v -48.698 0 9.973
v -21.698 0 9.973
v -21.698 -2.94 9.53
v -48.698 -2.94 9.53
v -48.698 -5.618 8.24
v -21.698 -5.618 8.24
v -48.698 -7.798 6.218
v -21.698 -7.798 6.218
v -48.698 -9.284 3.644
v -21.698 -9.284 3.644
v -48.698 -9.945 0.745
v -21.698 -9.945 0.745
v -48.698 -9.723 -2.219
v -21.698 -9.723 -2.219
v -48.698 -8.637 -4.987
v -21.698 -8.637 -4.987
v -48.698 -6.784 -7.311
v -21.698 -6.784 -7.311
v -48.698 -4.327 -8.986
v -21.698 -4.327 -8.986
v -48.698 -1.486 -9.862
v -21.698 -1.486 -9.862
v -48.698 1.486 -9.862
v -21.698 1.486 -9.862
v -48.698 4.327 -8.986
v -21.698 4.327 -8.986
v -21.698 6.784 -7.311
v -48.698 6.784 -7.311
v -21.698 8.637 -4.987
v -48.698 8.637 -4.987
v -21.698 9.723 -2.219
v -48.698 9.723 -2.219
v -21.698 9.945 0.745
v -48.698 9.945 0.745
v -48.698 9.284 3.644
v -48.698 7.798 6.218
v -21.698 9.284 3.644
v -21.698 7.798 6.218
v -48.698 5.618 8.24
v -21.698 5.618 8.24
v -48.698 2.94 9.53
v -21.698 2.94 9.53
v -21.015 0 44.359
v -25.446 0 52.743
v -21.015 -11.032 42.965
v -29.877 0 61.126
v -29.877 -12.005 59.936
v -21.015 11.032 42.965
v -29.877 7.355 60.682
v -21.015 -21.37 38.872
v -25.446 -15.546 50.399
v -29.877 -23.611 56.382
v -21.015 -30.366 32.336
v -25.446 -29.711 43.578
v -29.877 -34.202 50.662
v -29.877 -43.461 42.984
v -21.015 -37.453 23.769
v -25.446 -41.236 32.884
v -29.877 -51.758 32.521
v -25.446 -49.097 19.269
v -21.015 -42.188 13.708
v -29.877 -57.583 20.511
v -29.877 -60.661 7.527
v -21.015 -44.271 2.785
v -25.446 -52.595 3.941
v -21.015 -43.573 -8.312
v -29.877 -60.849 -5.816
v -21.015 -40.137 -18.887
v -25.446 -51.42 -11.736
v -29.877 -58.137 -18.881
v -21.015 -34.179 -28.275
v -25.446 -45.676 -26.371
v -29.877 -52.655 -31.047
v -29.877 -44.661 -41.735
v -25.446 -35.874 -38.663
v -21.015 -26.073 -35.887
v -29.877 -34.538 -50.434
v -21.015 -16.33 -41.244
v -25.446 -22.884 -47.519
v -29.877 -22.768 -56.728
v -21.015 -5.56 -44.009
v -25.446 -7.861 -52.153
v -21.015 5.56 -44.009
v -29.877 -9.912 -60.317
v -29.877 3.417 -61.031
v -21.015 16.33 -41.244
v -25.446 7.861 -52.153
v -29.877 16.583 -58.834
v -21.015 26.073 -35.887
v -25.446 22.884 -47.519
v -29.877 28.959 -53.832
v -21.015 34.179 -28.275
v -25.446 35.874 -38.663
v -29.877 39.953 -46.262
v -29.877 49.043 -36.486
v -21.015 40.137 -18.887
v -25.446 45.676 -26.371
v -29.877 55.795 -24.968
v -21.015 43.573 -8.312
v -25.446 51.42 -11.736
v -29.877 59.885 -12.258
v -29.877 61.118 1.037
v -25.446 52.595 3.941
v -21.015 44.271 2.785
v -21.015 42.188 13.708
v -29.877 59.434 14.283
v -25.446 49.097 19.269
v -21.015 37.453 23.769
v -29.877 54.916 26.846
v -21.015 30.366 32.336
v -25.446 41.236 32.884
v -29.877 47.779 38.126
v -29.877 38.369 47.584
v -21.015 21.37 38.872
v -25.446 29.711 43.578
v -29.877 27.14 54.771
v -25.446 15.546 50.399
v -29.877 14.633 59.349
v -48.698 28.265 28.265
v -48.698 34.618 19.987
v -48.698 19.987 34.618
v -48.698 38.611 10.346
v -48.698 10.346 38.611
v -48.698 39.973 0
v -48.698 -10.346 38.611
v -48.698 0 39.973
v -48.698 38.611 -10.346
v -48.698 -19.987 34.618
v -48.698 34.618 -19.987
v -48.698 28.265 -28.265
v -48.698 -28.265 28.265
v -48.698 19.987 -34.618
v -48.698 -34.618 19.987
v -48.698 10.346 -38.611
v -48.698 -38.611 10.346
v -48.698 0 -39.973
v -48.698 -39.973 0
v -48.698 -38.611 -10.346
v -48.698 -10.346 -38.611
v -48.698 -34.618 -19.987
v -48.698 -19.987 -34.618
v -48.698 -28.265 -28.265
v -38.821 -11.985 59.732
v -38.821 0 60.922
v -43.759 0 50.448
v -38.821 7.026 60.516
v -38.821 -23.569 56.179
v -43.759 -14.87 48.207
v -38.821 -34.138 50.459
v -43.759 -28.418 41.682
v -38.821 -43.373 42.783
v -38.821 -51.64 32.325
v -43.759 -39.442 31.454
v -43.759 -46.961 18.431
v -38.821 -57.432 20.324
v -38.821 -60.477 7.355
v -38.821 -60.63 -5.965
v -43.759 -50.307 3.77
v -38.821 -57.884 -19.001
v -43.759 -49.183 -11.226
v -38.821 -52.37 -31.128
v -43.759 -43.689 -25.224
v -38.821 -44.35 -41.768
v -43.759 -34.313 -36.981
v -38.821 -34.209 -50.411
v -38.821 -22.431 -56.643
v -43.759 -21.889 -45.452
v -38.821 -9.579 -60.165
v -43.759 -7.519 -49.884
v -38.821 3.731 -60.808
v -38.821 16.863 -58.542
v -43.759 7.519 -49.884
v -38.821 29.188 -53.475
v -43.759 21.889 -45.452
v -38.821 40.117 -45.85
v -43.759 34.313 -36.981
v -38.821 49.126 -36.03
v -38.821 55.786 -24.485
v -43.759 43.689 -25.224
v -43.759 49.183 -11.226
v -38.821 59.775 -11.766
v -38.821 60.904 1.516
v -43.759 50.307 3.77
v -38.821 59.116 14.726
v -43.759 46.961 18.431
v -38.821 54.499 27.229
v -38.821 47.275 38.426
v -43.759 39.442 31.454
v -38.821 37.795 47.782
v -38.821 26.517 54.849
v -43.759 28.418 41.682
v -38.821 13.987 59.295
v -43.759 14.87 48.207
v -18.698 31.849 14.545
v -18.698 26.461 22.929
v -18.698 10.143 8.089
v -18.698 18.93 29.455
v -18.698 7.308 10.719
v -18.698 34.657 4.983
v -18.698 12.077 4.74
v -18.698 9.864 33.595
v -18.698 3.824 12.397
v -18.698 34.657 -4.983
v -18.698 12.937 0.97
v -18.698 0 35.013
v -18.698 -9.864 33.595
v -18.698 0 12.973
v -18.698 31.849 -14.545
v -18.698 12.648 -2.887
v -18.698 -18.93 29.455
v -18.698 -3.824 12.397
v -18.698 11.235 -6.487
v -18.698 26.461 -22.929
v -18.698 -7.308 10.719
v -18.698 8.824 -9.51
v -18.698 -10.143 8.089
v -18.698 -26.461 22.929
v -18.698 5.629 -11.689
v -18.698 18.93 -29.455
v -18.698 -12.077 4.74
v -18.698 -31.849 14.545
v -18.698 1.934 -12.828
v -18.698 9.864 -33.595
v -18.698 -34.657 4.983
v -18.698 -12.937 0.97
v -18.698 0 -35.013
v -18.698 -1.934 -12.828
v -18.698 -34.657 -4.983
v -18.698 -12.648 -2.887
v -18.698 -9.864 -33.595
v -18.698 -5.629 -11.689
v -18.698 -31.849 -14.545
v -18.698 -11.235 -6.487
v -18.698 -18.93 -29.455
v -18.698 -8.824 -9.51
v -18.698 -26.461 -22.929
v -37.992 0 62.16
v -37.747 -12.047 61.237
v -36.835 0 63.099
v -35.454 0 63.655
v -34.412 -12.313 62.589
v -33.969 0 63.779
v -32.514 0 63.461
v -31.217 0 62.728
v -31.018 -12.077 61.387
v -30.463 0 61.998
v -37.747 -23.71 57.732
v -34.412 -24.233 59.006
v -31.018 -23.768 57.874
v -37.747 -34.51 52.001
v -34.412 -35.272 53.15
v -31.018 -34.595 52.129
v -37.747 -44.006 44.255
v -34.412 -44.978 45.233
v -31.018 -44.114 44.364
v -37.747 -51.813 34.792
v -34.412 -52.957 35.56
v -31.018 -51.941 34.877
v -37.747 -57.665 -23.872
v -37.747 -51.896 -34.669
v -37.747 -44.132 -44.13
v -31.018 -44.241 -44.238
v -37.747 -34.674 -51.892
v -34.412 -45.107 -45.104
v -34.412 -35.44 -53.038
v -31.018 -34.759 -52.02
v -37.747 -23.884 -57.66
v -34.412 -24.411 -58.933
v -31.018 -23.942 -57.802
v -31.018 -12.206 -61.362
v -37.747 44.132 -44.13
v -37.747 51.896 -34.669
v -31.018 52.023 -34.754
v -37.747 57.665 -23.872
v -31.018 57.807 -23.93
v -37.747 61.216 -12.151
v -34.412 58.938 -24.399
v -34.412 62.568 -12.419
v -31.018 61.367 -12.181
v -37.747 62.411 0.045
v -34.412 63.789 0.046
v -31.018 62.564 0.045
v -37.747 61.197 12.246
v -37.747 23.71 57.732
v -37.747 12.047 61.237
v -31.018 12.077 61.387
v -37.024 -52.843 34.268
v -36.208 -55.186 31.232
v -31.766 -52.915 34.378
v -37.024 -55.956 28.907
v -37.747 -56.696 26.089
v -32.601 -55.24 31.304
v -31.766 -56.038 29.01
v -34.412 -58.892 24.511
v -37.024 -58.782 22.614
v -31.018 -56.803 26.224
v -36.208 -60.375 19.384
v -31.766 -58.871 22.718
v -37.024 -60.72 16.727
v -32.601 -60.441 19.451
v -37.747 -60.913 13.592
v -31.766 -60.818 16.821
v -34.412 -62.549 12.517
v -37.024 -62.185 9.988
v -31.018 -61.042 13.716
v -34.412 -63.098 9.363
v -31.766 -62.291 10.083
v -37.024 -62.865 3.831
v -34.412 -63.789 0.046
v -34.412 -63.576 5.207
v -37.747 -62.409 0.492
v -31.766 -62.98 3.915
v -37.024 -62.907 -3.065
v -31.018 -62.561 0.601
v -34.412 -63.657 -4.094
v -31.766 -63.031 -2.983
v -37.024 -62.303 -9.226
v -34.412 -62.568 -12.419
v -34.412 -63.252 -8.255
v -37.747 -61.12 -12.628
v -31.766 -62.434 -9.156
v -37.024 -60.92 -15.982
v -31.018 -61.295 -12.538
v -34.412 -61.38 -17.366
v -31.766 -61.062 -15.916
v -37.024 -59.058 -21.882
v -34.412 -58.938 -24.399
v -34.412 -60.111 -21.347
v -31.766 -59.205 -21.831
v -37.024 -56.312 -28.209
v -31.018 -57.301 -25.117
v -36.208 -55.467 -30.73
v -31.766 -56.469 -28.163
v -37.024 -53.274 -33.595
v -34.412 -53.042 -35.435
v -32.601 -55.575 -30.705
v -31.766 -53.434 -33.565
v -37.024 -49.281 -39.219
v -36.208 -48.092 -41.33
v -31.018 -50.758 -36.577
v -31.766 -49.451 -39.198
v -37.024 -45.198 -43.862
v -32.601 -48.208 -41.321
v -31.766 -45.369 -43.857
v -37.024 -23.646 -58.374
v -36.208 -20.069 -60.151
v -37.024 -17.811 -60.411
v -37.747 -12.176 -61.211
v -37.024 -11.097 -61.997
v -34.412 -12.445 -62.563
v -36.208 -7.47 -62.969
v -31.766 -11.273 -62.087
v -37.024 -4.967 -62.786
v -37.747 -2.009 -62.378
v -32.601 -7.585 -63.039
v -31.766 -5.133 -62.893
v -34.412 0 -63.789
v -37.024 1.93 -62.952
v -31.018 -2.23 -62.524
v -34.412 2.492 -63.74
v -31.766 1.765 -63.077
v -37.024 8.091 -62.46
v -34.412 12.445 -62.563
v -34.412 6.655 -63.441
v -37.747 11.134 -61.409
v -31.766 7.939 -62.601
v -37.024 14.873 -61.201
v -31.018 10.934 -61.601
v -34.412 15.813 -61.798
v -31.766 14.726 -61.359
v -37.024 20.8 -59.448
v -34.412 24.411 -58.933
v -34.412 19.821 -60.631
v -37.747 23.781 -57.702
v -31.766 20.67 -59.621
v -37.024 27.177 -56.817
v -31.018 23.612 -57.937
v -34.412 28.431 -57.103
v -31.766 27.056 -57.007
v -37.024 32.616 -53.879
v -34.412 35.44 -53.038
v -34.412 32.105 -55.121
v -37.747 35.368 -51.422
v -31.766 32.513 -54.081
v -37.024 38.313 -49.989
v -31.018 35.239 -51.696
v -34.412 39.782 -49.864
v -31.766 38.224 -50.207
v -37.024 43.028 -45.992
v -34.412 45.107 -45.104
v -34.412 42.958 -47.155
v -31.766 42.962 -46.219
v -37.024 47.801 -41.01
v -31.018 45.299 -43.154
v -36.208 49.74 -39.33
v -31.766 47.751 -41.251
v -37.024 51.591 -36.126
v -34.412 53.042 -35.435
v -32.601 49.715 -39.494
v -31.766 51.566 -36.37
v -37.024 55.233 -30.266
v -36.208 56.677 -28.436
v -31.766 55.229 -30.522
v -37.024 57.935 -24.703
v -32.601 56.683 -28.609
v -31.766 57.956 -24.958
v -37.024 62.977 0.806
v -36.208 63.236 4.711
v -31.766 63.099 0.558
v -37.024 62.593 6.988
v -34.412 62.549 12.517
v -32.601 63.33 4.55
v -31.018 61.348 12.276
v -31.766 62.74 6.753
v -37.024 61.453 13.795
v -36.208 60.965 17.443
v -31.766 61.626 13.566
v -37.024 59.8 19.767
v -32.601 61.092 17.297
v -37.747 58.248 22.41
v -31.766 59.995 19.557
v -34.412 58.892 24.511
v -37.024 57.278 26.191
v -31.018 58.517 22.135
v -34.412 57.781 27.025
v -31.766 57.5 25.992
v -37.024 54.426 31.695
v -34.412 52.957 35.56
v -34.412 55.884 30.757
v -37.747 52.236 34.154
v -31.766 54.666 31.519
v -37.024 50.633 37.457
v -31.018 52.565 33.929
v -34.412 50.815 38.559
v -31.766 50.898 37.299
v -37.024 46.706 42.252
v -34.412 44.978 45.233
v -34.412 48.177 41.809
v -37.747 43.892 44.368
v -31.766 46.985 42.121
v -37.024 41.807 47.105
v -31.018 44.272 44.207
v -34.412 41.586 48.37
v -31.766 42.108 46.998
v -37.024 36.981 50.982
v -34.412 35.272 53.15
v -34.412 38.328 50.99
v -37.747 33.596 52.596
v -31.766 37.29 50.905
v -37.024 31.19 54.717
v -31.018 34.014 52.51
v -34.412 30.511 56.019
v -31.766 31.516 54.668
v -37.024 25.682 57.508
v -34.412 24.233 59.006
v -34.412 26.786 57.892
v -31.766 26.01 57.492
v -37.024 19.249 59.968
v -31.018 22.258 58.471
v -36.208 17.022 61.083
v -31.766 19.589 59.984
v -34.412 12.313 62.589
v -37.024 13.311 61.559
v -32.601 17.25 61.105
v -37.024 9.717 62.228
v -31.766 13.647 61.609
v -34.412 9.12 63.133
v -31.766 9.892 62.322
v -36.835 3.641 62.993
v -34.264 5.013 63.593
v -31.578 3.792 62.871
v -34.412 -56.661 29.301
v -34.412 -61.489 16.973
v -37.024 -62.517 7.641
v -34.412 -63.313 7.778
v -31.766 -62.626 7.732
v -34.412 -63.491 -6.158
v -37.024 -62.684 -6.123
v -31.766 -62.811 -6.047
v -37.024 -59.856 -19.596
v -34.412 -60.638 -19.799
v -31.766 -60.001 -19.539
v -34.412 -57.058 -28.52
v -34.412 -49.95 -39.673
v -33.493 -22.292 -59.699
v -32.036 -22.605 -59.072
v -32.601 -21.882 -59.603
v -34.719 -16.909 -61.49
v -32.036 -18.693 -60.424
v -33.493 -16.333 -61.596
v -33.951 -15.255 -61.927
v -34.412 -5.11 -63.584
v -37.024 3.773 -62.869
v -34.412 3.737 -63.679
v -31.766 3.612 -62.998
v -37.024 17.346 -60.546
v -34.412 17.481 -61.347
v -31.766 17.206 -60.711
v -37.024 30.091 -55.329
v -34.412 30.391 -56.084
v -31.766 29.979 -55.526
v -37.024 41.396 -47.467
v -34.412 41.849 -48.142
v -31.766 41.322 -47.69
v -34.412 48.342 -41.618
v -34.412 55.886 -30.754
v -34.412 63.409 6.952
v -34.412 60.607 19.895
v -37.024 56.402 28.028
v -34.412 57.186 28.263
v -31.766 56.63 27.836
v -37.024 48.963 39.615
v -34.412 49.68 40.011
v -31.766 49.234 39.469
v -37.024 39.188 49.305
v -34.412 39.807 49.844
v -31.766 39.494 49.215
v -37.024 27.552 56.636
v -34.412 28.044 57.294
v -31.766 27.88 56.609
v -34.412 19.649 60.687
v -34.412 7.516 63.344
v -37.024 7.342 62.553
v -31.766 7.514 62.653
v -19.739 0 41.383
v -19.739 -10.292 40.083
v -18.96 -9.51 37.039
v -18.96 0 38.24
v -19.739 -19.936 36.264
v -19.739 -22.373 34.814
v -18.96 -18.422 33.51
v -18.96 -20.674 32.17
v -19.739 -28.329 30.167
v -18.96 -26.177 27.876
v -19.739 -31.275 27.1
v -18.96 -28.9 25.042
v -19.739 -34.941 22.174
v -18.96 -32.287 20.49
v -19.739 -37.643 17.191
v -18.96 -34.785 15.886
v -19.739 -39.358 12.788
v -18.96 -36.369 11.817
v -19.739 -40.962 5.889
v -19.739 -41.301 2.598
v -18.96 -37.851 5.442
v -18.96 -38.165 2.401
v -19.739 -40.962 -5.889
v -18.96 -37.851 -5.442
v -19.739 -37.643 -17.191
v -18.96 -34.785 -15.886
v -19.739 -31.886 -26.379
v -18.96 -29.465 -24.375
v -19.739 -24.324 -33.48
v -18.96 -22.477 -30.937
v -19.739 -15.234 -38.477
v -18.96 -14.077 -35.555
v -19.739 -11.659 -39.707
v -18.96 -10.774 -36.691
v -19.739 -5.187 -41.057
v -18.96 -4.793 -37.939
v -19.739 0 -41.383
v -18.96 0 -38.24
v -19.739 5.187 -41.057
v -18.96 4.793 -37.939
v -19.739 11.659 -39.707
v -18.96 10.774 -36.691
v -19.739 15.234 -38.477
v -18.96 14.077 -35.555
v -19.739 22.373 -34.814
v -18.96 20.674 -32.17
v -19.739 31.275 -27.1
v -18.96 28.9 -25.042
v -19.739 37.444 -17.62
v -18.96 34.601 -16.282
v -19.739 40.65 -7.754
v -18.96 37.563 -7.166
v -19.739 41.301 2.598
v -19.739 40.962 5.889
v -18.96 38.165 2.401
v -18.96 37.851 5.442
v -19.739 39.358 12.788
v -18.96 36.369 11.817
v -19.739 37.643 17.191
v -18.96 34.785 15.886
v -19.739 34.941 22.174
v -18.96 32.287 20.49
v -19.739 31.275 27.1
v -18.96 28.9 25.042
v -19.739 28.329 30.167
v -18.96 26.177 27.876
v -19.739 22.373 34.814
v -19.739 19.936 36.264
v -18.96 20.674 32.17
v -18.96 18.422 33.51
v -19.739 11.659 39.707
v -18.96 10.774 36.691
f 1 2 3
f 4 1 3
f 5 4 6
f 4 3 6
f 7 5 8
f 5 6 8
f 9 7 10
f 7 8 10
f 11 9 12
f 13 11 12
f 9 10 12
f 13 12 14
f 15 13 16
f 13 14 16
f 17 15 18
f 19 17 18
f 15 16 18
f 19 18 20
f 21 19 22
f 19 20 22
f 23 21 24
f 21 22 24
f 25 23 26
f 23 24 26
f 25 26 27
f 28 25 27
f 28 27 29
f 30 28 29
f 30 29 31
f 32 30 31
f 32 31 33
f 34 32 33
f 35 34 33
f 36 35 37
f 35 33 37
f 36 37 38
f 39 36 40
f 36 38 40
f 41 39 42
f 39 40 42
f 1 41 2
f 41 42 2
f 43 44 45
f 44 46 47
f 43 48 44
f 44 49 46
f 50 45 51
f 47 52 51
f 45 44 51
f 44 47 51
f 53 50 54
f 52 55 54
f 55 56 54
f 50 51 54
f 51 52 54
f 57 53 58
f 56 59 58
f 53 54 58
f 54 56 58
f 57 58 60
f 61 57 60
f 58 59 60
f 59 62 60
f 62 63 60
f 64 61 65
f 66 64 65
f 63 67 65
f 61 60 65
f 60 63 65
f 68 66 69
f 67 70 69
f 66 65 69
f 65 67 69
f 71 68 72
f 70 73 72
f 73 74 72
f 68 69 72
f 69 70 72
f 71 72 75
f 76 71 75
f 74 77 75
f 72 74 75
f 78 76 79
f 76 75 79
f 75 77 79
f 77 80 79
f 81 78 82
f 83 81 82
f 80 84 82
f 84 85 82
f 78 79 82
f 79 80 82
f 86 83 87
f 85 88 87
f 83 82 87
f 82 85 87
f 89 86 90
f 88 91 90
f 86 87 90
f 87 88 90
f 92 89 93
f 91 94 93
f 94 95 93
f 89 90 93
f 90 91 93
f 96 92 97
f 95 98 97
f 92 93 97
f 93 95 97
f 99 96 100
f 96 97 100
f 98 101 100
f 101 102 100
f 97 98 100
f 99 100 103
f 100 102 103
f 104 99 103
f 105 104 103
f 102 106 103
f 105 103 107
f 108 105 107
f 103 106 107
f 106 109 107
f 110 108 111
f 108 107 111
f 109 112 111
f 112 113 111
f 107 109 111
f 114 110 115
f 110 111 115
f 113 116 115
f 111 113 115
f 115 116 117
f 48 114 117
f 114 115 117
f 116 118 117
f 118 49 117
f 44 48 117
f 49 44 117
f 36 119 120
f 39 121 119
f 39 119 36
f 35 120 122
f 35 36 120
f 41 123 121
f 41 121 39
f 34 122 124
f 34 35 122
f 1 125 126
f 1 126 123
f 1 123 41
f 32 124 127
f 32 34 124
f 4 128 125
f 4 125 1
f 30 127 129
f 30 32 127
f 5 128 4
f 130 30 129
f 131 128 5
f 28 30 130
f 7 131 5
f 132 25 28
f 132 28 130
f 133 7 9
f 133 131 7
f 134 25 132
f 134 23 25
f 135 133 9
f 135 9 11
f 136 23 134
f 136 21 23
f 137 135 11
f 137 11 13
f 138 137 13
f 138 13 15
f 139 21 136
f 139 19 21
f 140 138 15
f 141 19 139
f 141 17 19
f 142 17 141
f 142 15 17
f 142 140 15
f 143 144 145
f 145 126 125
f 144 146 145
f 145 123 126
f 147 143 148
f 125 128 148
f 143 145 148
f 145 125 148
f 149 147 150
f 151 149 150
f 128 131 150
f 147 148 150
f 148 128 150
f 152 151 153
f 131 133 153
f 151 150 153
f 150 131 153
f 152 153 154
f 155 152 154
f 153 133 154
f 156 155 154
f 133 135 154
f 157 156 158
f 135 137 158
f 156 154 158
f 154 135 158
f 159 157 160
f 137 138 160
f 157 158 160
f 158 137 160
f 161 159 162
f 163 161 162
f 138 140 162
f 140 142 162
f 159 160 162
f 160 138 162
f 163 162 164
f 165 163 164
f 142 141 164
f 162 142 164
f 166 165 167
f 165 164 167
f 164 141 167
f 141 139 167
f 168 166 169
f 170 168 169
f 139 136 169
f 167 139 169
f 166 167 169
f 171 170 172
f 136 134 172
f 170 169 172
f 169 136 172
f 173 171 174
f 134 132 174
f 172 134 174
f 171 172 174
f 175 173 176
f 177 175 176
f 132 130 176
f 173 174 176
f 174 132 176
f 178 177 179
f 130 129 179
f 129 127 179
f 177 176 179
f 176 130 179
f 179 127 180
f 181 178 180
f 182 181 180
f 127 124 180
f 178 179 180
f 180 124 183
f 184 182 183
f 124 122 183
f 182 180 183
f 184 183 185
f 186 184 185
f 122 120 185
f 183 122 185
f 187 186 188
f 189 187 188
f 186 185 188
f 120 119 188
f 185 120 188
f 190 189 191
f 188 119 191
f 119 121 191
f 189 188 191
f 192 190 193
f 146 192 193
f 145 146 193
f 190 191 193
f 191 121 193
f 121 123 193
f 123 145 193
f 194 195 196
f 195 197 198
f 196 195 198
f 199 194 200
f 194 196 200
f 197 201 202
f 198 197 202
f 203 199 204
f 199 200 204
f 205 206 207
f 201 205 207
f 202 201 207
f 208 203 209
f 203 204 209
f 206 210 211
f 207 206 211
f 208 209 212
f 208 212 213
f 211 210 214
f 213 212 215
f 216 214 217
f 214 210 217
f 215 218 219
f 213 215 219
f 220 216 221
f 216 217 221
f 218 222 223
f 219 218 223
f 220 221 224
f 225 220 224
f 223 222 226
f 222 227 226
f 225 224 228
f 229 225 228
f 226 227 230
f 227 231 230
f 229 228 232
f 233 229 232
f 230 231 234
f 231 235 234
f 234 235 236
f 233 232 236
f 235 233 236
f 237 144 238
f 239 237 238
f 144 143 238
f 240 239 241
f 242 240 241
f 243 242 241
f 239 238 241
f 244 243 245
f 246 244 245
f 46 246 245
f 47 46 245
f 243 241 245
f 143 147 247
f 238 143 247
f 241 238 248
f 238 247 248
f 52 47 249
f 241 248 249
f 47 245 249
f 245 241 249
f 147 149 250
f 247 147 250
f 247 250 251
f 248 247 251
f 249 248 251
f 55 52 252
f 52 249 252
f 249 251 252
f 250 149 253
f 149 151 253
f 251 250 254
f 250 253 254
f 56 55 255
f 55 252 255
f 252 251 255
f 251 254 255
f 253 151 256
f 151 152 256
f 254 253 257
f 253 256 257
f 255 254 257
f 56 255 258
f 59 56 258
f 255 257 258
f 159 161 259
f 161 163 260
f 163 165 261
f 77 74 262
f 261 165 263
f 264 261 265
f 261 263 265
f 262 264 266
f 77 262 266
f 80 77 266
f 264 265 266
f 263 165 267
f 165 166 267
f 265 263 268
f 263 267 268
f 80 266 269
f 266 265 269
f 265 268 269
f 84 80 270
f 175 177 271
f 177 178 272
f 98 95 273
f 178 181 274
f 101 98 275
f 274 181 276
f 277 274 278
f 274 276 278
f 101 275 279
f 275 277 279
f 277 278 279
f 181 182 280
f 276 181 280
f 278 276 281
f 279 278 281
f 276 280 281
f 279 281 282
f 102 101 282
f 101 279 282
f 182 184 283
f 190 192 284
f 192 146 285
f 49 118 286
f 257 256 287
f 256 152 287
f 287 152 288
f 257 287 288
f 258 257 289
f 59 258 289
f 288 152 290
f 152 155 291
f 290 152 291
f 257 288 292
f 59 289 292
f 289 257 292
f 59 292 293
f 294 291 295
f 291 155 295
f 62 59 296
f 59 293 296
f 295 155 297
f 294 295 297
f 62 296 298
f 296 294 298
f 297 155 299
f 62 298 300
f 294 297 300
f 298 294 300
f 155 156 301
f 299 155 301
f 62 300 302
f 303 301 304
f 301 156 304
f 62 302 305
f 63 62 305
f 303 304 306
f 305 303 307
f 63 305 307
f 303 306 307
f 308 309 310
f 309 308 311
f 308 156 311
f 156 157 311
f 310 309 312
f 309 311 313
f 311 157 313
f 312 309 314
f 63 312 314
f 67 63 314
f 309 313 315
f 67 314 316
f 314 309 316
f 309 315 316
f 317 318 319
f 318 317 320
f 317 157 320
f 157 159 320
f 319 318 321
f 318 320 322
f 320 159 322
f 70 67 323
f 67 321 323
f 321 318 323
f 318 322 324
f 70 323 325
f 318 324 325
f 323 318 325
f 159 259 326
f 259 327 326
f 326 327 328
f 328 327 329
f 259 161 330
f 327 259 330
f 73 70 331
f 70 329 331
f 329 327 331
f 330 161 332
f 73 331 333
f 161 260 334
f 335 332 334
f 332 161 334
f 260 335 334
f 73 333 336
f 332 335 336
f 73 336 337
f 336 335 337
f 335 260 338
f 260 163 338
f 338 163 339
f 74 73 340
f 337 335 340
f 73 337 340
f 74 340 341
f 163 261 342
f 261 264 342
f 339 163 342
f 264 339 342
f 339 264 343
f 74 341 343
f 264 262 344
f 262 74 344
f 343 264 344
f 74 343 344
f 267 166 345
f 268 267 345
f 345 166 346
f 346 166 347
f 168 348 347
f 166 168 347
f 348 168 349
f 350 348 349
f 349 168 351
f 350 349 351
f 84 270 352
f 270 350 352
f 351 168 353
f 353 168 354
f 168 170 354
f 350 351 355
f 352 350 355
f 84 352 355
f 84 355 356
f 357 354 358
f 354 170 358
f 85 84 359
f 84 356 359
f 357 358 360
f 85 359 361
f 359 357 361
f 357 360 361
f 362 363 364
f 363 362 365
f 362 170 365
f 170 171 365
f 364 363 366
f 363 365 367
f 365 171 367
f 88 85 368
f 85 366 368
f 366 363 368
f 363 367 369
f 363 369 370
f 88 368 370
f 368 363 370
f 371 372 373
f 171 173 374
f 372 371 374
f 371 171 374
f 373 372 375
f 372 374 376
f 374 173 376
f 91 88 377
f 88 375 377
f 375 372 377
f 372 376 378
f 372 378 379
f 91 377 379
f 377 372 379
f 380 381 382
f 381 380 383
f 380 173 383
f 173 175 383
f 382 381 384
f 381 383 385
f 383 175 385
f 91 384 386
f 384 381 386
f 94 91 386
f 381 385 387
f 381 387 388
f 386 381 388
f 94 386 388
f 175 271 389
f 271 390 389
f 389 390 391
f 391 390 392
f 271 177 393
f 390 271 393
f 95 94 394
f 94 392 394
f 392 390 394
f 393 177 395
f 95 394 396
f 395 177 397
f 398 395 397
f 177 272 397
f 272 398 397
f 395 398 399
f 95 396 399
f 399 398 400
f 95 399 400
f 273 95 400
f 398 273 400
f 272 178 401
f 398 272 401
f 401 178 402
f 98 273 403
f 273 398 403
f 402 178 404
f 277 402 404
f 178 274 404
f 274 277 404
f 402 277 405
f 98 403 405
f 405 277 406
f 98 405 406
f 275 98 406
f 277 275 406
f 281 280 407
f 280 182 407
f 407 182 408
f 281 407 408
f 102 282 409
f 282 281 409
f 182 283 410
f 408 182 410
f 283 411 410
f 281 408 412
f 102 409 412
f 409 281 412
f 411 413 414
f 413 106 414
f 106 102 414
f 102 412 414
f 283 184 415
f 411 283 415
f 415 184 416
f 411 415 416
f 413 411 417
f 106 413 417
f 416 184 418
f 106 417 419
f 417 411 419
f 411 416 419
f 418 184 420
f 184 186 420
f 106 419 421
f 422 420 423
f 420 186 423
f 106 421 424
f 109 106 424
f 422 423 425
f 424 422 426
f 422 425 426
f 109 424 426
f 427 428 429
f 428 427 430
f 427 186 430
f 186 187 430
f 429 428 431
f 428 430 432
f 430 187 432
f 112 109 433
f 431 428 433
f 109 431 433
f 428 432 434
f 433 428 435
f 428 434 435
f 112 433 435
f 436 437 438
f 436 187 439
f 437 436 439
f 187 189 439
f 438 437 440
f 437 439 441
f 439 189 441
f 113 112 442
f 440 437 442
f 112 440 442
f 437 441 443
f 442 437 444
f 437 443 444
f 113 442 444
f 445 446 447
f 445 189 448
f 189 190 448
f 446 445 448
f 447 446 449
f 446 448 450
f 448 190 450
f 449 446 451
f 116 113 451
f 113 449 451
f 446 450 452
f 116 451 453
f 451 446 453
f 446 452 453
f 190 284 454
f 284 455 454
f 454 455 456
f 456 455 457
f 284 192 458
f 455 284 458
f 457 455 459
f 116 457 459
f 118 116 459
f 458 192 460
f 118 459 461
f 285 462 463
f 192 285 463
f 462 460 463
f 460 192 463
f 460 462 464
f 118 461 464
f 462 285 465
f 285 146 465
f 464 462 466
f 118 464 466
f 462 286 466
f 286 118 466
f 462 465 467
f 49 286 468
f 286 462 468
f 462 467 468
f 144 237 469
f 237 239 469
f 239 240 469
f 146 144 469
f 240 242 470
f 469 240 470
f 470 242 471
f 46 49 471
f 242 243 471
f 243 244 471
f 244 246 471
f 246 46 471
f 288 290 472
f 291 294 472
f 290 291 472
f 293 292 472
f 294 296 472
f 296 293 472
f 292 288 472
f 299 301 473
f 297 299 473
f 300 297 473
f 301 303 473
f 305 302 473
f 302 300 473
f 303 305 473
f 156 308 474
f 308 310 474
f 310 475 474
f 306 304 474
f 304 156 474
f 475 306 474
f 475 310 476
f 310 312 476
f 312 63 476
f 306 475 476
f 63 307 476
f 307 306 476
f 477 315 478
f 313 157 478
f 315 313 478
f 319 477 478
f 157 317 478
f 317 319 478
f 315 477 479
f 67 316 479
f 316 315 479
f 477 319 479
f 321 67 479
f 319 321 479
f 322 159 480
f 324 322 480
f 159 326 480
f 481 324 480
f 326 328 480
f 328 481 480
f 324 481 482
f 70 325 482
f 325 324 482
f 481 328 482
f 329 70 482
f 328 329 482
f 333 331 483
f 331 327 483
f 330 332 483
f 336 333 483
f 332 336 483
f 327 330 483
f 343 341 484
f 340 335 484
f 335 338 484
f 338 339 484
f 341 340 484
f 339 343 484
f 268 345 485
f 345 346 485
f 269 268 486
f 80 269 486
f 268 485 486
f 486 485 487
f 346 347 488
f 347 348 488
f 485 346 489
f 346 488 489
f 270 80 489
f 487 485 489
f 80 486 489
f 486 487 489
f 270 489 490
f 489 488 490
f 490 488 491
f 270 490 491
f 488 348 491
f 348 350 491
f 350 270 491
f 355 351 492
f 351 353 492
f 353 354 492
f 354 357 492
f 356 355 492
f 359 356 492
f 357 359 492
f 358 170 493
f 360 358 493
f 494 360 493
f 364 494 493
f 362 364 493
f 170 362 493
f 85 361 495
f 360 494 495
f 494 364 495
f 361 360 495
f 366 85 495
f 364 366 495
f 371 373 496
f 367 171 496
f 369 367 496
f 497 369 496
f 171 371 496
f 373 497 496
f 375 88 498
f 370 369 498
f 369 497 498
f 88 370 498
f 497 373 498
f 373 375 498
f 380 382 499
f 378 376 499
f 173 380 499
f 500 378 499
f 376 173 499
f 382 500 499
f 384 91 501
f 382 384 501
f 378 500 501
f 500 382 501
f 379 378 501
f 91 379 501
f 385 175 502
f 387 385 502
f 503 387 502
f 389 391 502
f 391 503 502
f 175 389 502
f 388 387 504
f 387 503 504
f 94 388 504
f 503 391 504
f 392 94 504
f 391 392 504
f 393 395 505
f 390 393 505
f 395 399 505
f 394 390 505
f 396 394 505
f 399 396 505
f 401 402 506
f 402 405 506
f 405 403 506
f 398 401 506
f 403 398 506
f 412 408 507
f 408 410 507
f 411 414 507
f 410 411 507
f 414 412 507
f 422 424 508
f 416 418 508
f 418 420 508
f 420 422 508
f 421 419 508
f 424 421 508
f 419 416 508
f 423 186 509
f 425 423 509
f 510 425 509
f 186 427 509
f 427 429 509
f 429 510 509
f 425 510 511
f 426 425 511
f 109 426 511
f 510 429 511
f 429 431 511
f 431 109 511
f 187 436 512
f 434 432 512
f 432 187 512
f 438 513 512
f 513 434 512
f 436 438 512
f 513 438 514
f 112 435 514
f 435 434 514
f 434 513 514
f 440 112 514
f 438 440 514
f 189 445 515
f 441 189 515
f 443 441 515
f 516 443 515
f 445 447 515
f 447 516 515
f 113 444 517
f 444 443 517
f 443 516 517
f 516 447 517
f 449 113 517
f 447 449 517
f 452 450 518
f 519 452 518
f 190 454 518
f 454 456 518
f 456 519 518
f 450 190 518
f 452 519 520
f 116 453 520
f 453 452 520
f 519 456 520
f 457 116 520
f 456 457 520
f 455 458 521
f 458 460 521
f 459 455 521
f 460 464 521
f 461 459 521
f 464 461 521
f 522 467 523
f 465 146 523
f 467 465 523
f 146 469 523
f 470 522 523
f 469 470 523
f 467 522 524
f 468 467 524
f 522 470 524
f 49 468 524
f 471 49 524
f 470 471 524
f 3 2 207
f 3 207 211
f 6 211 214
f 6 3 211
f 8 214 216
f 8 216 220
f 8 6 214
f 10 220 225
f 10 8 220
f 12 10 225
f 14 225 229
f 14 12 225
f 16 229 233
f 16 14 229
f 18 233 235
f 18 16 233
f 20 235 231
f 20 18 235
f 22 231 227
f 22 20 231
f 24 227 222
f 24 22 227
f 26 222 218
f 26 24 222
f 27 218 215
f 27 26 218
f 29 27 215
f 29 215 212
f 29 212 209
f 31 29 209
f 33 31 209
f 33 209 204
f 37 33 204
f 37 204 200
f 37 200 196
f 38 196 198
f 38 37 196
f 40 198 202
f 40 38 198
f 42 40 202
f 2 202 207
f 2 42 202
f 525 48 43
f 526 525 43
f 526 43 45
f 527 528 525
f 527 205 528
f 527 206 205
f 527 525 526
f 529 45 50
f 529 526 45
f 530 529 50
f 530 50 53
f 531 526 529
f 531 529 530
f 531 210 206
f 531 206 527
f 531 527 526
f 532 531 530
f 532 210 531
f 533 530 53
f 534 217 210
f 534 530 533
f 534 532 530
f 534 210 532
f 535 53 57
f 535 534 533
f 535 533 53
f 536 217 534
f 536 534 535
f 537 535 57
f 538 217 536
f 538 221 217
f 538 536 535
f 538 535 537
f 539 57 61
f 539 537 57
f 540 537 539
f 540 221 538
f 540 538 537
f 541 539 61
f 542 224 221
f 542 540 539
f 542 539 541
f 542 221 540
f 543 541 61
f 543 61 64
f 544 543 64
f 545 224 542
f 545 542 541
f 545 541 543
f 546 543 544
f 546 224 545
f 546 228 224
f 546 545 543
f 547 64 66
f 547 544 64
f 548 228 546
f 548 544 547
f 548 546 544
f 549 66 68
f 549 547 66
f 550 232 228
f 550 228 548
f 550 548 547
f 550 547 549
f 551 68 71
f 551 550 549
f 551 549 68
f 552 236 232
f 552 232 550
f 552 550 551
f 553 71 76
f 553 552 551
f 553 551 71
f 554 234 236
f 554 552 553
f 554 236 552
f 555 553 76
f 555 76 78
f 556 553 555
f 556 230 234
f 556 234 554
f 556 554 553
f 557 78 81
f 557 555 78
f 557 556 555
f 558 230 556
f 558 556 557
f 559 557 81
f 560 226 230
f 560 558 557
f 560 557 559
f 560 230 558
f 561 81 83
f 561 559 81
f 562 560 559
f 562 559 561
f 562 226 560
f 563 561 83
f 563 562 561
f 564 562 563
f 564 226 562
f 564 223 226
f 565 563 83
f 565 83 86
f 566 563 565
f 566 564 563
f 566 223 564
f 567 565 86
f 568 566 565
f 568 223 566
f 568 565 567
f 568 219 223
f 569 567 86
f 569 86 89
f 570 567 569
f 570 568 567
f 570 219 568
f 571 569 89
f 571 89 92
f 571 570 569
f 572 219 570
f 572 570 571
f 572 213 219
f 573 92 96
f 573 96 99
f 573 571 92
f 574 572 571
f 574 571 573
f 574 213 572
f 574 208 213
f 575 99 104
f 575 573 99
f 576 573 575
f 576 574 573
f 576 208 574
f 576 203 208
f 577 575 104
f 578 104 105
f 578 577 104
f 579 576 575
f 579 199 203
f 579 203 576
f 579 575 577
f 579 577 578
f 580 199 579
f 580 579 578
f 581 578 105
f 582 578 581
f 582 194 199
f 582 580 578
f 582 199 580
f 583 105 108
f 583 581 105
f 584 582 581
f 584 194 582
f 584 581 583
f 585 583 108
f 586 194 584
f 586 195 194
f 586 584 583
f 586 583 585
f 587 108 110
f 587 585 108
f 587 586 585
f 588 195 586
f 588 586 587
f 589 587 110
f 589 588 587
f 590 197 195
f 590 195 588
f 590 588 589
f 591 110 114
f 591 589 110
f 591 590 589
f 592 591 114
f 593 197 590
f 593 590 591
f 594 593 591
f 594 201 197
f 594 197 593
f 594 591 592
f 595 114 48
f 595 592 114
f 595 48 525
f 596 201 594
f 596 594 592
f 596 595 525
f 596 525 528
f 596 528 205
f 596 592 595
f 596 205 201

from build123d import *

# Parameters (mm, degrees)
F0_W    = 30
F0_H    = 30
F7_R    = 5
F1_R    = 20
F2_SIZE = 3


# Not quite as in the source:
# - the program builds the solid bodies; features that only make, move or delete a surface that nothing else refers to are left out


with BuildPart() as f6:
    # F0 (on Front) → F6 (revolve)
    with BuildSketch(Plane.XZ):
        Polygon((-34.5531404018, 69.9733775854), (-48.6977283961, 39.9733775854), (-18.6977283961, 39.9733775854), align=None)
        with Locations((-33.6977283961, 24.9733775854)):
            Rectangle(F0_W, F0_H)
    revolve(axis=Axis((8.8008791208, 0, 0), (1, 0, 0)))

    # F7
    f7_edges = [f6.edges().sort_by_distance(p)[0] for p in [
        (-34.55314, 0, -69.973378),
    ]]
    fillet(f7_edges, radius=F7_R)

    # F1
    f1_edges = [f6.edges().sort_by_distance(p)[0] for p in [
        (-18.697728, 0, -39.973378),
    ]]
    fillet(f1_edges, radius=F1_R)

    # F2
    f2_edges = [f6.edges().sort_by_distance(p)[0] for p in [
        (-18.697728, 0, -9.973378),
    ]]
    chamfer(f2_edges, length=F2_SIZE)


solid = f6.part
